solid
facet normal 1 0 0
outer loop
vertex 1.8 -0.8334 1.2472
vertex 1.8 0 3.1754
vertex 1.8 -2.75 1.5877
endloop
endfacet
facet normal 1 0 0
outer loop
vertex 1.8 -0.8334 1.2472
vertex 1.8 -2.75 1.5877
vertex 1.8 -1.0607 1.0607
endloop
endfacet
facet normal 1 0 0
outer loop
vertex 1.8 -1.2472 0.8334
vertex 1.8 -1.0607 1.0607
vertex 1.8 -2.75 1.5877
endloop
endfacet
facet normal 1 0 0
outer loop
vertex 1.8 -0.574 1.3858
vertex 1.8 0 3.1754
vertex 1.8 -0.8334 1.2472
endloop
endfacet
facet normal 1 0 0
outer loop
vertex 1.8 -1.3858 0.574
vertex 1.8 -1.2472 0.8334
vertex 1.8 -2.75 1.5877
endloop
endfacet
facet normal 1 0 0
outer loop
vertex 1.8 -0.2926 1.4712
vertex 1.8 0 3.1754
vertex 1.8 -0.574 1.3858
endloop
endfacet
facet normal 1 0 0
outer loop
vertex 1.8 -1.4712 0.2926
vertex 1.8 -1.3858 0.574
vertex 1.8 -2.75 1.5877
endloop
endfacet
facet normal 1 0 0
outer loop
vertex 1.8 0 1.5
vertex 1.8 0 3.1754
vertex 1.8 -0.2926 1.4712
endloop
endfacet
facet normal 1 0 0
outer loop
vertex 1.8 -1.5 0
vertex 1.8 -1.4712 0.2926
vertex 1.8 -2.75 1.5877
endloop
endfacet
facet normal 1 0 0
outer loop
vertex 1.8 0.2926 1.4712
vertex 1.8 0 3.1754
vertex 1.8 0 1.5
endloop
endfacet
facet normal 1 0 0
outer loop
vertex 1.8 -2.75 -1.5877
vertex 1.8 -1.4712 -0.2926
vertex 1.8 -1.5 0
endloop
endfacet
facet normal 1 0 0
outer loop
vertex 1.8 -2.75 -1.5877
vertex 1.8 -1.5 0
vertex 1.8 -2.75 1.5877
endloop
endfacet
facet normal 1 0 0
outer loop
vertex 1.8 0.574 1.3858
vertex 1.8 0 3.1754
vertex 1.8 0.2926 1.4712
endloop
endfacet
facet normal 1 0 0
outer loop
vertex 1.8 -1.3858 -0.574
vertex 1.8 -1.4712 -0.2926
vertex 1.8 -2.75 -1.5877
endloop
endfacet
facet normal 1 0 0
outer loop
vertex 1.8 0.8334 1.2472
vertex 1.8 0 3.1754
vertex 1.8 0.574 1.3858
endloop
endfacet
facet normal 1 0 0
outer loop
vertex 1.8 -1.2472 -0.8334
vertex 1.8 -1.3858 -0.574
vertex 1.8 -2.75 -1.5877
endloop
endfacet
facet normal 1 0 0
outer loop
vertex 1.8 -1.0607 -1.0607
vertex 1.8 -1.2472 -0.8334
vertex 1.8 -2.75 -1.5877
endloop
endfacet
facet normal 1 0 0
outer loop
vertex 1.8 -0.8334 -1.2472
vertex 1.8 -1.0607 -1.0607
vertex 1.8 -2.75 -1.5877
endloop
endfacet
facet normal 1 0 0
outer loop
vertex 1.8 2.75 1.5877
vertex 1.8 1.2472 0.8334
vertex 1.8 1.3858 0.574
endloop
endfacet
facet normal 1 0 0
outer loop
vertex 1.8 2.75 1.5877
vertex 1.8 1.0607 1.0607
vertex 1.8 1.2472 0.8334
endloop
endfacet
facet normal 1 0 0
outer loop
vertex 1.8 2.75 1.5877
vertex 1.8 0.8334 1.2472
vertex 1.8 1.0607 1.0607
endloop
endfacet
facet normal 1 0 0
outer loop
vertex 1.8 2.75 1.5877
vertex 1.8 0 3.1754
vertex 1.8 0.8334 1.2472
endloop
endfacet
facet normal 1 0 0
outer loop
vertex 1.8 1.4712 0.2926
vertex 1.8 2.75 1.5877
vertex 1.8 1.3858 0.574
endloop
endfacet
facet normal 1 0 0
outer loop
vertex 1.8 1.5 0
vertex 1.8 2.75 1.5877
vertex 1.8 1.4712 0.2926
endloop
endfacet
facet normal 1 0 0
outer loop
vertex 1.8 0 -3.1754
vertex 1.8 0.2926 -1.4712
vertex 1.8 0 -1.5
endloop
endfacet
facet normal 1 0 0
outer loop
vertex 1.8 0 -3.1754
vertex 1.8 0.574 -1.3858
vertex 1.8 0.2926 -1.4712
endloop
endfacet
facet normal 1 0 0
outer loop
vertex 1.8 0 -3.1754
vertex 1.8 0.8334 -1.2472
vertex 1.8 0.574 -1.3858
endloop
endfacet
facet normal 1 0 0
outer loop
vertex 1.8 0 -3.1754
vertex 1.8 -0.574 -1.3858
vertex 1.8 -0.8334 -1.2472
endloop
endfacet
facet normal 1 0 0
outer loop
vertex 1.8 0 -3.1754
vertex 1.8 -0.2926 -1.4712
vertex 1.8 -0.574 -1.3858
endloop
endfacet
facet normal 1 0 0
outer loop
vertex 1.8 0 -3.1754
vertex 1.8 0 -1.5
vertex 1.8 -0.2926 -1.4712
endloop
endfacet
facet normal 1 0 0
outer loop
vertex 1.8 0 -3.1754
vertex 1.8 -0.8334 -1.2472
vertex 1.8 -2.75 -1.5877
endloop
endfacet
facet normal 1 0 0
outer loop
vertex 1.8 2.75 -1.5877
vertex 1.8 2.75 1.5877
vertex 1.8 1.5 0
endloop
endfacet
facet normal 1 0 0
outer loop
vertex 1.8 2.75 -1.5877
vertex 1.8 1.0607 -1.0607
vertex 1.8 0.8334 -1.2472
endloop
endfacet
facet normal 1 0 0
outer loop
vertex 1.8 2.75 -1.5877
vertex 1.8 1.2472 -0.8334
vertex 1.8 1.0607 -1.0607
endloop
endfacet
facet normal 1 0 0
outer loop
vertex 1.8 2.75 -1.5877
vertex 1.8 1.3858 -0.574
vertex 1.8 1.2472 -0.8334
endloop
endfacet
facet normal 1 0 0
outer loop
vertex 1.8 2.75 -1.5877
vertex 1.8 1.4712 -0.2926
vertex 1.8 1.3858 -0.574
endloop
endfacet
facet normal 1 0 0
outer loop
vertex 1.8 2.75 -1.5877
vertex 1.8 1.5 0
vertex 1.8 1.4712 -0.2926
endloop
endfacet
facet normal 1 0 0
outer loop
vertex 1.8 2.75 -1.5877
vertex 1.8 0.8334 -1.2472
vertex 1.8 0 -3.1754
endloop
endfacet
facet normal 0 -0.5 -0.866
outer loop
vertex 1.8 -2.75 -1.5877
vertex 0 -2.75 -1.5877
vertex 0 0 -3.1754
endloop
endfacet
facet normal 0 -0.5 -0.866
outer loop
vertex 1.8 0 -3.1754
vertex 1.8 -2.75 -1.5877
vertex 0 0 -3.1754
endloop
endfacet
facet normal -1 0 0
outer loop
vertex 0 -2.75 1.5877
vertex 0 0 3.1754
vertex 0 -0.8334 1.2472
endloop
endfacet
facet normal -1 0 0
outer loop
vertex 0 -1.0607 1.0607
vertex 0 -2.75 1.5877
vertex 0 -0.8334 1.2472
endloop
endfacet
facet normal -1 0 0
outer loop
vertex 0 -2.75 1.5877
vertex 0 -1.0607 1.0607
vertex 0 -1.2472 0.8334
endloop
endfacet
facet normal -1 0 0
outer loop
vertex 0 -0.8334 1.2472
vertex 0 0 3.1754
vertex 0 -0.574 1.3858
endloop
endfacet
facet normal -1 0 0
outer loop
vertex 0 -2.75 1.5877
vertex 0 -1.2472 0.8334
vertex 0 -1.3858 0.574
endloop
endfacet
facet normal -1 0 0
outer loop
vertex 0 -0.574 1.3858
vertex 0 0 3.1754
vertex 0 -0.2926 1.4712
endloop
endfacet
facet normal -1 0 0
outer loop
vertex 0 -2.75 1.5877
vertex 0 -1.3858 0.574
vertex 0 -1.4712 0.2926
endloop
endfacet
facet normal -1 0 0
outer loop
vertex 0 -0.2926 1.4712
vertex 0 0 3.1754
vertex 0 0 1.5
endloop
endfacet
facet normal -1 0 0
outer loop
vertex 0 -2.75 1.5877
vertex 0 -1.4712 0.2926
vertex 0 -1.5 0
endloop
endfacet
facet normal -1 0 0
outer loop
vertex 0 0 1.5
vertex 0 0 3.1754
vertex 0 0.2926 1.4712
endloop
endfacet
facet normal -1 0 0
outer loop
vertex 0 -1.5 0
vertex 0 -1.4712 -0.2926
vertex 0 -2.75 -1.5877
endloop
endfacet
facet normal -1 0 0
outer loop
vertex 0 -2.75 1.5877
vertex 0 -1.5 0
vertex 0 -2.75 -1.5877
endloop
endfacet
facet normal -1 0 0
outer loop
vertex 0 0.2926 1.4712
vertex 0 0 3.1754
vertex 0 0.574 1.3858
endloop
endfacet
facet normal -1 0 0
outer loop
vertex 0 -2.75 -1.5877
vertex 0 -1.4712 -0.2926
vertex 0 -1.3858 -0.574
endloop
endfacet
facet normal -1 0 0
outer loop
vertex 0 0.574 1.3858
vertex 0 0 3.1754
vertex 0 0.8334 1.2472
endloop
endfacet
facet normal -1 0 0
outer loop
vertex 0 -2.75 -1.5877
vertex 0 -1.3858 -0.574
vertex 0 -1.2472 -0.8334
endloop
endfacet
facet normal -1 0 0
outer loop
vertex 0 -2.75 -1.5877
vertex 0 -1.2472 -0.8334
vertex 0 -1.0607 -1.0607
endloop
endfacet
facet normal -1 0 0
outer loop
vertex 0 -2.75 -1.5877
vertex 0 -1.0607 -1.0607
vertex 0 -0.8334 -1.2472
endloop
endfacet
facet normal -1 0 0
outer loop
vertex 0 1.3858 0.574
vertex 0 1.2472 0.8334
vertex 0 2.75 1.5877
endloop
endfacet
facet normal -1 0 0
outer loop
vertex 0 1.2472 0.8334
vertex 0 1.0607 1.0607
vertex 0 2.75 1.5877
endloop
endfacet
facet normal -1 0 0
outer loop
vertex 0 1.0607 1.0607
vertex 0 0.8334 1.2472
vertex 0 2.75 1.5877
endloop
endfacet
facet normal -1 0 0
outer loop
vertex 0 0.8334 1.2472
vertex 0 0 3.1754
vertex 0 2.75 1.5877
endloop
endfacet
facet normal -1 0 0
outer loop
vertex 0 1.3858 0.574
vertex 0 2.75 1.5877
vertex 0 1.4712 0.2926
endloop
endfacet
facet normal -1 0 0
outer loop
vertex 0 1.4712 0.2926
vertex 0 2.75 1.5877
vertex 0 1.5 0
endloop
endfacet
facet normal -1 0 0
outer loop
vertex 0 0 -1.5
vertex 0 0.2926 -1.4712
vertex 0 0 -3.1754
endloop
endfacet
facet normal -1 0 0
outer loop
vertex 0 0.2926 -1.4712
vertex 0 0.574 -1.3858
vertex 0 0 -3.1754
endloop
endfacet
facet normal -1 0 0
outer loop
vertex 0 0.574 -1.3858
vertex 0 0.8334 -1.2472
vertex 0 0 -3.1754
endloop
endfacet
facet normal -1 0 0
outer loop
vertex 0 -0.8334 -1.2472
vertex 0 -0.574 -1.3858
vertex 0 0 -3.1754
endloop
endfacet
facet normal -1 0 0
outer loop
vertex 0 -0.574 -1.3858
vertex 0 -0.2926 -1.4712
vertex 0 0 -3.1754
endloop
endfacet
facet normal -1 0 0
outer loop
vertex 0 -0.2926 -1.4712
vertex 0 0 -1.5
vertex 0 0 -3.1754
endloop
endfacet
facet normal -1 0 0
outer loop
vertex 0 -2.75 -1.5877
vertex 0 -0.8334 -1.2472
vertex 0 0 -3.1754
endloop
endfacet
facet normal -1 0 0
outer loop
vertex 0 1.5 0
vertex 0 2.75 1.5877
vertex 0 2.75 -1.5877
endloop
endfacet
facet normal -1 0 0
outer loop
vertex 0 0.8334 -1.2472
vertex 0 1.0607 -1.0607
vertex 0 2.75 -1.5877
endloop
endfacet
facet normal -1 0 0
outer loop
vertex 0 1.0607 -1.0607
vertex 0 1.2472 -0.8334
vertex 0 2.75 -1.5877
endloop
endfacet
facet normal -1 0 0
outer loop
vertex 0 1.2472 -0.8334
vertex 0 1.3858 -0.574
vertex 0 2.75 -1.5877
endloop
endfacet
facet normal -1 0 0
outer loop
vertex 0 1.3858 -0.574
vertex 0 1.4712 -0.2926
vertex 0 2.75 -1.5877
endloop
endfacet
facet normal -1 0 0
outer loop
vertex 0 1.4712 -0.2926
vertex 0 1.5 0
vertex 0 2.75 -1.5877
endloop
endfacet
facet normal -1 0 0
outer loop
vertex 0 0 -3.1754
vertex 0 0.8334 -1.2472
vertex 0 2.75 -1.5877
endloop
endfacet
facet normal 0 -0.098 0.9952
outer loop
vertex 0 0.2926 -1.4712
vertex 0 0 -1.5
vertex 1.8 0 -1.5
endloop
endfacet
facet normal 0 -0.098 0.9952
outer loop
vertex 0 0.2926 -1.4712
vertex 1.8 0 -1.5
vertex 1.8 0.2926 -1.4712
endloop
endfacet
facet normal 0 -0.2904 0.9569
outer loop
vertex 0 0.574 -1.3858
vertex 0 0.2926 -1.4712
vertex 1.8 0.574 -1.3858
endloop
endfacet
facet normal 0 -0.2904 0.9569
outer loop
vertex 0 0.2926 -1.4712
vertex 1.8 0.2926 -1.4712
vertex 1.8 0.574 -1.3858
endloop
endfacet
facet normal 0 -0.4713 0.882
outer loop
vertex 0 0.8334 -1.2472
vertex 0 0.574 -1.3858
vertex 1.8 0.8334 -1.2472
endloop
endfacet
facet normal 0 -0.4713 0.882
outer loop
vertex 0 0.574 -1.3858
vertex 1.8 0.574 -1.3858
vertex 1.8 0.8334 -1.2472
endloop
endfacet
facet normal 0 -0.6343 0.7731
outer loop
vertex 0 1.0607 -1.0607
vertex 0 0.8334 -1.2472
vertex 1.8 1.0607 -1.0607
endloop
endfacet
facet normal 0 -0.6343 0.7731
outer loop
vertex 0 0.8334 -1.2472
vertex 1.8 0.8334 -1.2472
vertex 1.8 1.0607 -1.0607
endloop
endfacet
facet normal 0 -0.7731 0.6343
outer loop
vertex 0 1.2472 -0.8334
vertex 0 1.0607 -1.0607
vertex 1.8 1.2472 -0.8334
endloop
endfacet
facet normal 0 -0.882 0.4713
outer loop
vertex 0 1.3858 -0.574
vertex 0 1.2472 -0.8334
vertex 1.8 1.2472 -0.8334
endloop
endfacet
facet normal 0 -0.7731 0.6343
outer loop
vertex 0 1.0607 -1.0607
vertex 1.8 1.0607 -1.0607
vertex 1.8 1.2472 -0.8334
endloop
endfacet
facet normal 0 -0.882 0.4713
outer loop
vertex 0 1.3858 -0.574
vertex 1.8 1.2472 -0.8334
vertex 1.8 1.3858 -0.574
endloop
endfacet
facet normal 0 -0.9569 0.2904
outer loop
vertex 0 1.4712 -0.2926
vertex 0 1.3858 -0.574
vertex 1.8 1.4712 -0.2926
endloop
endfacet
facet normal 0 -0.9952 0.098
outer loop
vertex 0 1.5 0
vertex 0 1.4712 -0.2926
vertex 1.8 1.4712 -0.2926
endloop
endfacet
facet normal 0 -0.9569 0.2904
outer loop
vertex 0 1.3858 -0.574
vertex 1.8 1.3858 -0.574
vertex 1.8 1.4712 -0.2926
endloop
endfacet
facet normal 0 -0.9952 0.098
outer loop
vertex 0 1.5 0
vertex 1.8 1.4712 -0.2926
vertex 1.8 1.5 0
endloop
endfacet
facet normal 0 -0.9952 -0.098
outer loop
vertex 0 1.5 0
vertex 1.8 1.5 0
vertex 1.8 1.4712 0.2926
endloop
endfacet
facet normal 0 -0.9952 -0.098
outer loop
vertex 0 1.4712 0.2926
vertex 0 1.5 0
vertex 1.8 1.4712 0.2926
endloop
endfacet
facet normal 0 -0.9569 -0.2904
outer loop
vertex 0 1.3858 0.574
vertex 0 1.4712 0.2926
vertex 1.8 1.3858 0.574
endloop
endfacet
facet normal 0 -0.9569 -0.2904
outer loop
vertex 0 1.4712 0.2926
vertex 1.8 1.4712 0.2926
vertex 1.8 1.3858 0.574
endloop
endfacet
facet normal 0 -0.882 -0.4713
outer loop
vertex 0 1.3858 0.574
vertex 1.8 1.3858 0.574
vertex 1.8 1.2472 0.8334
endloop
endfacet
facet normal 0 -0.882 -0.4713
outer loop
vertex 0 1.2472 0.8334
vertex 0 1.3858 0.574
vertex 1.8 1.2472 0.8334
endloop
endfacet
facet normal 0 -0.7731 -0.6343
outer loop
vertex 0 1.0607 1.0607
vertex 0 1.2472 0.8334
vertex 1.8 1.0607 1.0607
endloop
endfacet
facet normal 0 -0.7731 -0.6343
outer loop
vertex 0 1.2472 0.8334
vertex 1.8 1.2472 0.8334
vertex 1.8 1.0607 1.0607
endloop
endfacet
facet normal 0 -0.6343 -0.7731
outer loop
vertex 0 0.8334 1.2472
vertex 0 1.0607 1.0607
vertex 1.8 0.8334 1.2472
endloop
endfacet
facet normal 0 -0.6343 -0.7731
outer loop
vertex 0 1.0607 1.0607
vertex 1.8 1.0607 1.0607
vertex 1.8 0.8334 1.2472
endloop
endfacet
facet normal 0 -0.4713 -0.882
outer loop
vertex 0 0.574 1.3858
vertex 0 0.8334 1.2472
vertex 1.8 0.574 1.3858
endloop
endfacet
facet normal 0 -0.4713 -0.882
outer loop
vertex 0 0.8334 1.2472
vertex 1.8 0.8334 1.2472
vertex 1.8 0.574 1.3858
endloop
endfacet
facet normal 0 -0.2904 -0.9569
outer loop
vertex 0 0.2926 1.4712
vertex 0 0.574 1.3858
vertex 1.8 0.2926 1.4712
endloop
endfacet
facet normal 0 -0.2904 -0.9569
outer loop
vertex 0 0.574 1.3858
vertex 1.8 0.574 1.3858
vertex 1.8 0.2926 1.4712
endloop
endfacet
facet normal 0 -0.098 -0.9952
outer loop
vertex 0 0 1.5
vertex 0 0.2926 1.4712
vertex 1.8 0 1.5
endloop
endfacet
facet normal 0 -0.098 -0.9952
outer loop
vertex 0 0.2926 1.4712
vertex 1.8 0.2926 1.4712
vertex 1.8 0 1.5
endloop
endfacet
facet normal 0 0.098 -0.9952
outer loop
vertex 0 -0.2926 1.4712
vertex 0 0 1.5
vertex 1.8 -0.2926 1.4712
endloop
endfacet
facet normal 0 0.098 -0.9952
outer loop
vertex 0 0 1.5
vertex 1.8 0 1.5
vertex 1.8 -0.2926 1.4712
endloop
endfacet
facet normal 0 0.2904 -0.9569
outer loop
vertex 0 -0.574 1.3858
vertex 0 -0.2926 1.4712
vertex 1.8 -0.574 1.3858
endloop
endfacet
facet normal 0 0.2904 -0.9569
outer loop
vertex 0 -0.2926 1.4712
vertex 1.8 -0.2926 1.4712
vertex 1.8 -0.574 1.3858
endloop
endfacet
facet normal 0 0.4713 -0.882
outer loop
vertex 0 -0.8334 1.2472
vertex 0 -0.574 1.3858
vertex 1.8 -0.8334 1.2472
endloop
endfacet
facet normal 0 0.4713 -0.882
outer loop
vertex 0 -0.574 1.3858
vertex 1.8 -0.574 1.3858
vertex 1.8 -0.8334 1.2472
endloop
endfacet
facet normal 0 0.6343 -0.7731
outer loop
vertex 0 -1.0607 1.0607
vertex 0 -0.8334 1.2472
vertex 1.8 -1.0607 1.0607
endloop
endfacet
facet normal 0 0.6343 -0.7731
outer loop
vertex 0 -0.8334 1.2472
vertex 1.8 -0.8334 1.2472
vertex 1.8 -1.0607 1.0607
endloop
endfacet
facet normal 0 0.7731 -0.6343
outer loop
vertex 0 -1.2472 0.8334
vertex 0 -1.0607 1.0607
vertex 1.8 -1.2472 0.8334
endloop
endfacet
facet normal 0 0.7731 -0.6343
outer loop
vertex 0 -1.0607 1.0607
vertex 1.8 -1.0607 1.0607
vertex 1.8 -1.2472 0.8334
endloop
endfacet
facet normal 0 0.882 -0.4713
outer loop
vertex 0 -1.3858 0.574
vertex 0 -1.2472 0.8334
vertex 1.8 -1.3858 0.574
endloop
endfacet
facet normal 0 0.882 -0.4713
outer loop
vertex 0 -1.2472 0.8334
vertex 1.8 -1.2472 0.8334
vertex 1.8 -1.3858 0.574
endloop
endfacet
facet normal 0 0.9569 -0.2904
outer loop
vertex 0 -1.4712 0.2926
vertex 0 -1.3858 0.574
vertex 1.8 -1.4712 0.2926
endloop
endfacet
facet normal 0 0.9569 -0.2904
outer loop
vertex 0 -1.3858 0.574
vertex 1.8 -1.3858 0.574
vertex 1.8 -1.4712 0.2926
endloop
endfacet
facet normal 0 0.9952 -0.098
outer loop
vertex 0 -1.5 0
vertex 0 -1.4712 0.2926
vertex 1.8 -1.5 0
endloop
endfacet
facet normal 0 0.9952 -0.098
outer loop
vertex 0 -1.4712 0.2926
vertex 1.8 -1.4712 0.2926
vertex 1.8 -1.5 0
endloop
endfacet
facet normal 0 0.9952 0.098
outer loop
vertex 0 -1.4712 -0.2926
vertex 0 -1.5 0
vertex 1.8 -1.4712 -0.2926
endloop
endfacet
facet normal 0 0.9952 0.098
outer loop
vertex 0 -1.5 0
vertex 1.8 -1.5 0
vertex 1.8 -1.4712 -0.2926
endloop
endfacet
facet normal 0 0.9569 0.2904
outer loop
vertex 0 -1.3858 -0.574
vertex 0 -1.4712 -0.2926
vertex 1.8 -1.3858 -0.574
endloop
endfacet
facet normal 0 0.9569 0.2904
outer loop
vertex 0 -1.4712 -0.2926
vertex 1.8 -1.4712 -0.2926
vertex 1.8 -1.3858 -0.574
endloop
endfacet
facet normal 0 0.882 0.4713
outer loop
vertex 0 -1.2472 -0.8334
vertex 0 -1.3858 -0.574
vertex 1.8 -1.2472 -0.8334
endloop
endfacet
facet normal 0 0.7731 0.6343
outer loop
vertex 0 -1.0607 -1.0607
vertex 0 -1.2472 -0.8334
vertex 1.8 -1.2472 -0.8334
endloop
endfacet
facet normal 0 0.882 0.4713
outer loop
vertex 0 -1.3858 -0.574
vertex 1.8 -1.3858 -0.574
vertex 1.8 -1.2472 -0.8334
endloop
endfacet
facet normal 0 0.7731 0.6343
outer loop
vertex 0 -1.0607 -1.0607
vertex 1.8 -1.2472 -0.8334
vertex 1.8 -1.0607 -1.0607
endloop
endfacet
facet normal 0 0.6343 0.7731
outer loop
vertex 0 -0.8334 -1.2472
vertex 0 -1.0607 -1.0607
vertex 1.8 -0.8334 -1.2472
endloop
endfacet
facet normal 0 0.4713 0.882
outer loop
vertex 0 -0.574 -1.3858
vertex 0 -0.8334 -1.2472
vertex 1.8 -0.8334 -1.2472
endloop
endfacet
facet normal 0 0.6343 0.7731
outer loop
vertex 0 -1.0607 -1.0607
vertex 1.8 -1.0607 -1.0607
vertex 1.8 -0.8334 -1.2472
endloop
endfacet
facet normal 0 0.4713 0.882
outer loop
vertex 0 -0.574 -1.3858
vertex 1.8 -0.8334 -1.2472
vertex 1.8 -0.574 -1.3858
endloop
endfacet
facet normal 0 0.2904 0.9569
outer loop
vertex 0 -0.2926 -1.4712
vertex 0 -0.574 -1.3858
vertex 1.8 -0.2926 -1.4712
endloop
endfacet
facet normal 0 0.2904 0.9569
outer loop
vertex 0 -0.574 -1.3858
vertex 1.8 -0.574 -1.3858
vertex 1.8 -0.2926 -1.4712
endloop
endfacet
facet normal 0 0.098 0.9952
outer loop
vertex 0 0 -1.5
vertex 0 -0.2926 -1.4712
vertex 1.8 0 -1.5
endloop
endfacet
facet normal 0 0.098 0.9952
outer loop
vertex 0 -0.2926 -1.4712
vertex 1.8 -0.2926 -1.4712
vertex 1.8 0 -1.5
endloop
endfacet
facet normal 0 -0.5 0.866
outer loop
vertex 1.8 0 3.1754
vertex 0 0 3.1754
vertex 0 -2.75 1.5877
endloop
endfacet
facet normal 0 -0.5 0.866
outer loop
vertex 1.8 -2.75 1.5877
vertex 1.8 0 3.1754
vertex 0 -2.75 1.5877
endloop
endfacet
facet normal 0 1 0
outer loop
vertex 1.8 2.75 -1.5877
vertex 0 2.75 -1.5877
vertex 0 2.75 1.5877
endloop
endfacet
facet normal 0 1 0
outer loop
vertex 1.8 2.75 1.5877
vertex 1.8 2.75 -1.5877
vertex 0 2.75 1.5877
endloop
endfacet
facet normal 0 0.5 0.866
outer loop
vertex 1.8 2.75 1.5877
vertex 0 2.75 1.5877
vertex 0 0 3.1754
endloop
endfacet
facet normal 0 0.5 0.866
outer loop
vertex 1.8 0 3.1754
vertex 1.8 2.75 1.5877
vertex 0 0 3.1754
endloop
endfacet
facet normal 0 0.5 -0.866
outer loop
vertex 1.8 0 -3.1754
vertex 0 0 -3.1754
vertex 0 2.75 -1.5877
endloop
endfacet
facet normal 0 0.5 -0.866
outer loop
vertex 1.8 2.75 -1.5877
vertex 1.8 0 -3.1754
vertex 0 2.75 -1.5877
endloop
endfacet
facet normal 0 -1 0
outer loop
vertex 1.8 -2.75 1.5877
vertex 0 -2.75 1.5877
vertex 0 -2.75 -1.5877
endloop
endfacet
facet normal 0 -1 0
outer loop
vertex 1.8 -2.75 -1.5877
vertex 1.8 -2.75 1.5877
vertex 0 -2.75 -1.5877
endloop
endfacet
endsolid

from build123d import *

# Parameters (mm, degrees)
NUT_DEPTH       = 1.8
THREAD_SKETCH_W = 3.8
THREAD_SKETCH_H = 1.5


with BuildPart() as part:
    # Nut Sketch → Nut (new body)
    with BuildSketch(Plane(origin=(0, 0, 0), x_dir=(0, 0, -1), z_dir=(1, 0, 0))):
        Polygon((3.175426481, 0), (1.58771324, 2.75), (-1.58771324, 2.75), (-3.175426481, 0), (-1.58771324, -2.75), (1.58771324, -2.75), align=None)
    extrude(amount=NUT_DEPTH)

    # Thread Sketch → Thread (revolve, cut)
    with BuildSketch(Plane.XY):
        with Locations((0.9, 0.75)):
            Rectangle(THREAD_SKETCH_W, THREAD_SKETCH_H)
    revolve(axis=Axis((-1000, 0, 0), (1, 0, 0)), mode=Mode.SUBTRACT)


solid = part.part
